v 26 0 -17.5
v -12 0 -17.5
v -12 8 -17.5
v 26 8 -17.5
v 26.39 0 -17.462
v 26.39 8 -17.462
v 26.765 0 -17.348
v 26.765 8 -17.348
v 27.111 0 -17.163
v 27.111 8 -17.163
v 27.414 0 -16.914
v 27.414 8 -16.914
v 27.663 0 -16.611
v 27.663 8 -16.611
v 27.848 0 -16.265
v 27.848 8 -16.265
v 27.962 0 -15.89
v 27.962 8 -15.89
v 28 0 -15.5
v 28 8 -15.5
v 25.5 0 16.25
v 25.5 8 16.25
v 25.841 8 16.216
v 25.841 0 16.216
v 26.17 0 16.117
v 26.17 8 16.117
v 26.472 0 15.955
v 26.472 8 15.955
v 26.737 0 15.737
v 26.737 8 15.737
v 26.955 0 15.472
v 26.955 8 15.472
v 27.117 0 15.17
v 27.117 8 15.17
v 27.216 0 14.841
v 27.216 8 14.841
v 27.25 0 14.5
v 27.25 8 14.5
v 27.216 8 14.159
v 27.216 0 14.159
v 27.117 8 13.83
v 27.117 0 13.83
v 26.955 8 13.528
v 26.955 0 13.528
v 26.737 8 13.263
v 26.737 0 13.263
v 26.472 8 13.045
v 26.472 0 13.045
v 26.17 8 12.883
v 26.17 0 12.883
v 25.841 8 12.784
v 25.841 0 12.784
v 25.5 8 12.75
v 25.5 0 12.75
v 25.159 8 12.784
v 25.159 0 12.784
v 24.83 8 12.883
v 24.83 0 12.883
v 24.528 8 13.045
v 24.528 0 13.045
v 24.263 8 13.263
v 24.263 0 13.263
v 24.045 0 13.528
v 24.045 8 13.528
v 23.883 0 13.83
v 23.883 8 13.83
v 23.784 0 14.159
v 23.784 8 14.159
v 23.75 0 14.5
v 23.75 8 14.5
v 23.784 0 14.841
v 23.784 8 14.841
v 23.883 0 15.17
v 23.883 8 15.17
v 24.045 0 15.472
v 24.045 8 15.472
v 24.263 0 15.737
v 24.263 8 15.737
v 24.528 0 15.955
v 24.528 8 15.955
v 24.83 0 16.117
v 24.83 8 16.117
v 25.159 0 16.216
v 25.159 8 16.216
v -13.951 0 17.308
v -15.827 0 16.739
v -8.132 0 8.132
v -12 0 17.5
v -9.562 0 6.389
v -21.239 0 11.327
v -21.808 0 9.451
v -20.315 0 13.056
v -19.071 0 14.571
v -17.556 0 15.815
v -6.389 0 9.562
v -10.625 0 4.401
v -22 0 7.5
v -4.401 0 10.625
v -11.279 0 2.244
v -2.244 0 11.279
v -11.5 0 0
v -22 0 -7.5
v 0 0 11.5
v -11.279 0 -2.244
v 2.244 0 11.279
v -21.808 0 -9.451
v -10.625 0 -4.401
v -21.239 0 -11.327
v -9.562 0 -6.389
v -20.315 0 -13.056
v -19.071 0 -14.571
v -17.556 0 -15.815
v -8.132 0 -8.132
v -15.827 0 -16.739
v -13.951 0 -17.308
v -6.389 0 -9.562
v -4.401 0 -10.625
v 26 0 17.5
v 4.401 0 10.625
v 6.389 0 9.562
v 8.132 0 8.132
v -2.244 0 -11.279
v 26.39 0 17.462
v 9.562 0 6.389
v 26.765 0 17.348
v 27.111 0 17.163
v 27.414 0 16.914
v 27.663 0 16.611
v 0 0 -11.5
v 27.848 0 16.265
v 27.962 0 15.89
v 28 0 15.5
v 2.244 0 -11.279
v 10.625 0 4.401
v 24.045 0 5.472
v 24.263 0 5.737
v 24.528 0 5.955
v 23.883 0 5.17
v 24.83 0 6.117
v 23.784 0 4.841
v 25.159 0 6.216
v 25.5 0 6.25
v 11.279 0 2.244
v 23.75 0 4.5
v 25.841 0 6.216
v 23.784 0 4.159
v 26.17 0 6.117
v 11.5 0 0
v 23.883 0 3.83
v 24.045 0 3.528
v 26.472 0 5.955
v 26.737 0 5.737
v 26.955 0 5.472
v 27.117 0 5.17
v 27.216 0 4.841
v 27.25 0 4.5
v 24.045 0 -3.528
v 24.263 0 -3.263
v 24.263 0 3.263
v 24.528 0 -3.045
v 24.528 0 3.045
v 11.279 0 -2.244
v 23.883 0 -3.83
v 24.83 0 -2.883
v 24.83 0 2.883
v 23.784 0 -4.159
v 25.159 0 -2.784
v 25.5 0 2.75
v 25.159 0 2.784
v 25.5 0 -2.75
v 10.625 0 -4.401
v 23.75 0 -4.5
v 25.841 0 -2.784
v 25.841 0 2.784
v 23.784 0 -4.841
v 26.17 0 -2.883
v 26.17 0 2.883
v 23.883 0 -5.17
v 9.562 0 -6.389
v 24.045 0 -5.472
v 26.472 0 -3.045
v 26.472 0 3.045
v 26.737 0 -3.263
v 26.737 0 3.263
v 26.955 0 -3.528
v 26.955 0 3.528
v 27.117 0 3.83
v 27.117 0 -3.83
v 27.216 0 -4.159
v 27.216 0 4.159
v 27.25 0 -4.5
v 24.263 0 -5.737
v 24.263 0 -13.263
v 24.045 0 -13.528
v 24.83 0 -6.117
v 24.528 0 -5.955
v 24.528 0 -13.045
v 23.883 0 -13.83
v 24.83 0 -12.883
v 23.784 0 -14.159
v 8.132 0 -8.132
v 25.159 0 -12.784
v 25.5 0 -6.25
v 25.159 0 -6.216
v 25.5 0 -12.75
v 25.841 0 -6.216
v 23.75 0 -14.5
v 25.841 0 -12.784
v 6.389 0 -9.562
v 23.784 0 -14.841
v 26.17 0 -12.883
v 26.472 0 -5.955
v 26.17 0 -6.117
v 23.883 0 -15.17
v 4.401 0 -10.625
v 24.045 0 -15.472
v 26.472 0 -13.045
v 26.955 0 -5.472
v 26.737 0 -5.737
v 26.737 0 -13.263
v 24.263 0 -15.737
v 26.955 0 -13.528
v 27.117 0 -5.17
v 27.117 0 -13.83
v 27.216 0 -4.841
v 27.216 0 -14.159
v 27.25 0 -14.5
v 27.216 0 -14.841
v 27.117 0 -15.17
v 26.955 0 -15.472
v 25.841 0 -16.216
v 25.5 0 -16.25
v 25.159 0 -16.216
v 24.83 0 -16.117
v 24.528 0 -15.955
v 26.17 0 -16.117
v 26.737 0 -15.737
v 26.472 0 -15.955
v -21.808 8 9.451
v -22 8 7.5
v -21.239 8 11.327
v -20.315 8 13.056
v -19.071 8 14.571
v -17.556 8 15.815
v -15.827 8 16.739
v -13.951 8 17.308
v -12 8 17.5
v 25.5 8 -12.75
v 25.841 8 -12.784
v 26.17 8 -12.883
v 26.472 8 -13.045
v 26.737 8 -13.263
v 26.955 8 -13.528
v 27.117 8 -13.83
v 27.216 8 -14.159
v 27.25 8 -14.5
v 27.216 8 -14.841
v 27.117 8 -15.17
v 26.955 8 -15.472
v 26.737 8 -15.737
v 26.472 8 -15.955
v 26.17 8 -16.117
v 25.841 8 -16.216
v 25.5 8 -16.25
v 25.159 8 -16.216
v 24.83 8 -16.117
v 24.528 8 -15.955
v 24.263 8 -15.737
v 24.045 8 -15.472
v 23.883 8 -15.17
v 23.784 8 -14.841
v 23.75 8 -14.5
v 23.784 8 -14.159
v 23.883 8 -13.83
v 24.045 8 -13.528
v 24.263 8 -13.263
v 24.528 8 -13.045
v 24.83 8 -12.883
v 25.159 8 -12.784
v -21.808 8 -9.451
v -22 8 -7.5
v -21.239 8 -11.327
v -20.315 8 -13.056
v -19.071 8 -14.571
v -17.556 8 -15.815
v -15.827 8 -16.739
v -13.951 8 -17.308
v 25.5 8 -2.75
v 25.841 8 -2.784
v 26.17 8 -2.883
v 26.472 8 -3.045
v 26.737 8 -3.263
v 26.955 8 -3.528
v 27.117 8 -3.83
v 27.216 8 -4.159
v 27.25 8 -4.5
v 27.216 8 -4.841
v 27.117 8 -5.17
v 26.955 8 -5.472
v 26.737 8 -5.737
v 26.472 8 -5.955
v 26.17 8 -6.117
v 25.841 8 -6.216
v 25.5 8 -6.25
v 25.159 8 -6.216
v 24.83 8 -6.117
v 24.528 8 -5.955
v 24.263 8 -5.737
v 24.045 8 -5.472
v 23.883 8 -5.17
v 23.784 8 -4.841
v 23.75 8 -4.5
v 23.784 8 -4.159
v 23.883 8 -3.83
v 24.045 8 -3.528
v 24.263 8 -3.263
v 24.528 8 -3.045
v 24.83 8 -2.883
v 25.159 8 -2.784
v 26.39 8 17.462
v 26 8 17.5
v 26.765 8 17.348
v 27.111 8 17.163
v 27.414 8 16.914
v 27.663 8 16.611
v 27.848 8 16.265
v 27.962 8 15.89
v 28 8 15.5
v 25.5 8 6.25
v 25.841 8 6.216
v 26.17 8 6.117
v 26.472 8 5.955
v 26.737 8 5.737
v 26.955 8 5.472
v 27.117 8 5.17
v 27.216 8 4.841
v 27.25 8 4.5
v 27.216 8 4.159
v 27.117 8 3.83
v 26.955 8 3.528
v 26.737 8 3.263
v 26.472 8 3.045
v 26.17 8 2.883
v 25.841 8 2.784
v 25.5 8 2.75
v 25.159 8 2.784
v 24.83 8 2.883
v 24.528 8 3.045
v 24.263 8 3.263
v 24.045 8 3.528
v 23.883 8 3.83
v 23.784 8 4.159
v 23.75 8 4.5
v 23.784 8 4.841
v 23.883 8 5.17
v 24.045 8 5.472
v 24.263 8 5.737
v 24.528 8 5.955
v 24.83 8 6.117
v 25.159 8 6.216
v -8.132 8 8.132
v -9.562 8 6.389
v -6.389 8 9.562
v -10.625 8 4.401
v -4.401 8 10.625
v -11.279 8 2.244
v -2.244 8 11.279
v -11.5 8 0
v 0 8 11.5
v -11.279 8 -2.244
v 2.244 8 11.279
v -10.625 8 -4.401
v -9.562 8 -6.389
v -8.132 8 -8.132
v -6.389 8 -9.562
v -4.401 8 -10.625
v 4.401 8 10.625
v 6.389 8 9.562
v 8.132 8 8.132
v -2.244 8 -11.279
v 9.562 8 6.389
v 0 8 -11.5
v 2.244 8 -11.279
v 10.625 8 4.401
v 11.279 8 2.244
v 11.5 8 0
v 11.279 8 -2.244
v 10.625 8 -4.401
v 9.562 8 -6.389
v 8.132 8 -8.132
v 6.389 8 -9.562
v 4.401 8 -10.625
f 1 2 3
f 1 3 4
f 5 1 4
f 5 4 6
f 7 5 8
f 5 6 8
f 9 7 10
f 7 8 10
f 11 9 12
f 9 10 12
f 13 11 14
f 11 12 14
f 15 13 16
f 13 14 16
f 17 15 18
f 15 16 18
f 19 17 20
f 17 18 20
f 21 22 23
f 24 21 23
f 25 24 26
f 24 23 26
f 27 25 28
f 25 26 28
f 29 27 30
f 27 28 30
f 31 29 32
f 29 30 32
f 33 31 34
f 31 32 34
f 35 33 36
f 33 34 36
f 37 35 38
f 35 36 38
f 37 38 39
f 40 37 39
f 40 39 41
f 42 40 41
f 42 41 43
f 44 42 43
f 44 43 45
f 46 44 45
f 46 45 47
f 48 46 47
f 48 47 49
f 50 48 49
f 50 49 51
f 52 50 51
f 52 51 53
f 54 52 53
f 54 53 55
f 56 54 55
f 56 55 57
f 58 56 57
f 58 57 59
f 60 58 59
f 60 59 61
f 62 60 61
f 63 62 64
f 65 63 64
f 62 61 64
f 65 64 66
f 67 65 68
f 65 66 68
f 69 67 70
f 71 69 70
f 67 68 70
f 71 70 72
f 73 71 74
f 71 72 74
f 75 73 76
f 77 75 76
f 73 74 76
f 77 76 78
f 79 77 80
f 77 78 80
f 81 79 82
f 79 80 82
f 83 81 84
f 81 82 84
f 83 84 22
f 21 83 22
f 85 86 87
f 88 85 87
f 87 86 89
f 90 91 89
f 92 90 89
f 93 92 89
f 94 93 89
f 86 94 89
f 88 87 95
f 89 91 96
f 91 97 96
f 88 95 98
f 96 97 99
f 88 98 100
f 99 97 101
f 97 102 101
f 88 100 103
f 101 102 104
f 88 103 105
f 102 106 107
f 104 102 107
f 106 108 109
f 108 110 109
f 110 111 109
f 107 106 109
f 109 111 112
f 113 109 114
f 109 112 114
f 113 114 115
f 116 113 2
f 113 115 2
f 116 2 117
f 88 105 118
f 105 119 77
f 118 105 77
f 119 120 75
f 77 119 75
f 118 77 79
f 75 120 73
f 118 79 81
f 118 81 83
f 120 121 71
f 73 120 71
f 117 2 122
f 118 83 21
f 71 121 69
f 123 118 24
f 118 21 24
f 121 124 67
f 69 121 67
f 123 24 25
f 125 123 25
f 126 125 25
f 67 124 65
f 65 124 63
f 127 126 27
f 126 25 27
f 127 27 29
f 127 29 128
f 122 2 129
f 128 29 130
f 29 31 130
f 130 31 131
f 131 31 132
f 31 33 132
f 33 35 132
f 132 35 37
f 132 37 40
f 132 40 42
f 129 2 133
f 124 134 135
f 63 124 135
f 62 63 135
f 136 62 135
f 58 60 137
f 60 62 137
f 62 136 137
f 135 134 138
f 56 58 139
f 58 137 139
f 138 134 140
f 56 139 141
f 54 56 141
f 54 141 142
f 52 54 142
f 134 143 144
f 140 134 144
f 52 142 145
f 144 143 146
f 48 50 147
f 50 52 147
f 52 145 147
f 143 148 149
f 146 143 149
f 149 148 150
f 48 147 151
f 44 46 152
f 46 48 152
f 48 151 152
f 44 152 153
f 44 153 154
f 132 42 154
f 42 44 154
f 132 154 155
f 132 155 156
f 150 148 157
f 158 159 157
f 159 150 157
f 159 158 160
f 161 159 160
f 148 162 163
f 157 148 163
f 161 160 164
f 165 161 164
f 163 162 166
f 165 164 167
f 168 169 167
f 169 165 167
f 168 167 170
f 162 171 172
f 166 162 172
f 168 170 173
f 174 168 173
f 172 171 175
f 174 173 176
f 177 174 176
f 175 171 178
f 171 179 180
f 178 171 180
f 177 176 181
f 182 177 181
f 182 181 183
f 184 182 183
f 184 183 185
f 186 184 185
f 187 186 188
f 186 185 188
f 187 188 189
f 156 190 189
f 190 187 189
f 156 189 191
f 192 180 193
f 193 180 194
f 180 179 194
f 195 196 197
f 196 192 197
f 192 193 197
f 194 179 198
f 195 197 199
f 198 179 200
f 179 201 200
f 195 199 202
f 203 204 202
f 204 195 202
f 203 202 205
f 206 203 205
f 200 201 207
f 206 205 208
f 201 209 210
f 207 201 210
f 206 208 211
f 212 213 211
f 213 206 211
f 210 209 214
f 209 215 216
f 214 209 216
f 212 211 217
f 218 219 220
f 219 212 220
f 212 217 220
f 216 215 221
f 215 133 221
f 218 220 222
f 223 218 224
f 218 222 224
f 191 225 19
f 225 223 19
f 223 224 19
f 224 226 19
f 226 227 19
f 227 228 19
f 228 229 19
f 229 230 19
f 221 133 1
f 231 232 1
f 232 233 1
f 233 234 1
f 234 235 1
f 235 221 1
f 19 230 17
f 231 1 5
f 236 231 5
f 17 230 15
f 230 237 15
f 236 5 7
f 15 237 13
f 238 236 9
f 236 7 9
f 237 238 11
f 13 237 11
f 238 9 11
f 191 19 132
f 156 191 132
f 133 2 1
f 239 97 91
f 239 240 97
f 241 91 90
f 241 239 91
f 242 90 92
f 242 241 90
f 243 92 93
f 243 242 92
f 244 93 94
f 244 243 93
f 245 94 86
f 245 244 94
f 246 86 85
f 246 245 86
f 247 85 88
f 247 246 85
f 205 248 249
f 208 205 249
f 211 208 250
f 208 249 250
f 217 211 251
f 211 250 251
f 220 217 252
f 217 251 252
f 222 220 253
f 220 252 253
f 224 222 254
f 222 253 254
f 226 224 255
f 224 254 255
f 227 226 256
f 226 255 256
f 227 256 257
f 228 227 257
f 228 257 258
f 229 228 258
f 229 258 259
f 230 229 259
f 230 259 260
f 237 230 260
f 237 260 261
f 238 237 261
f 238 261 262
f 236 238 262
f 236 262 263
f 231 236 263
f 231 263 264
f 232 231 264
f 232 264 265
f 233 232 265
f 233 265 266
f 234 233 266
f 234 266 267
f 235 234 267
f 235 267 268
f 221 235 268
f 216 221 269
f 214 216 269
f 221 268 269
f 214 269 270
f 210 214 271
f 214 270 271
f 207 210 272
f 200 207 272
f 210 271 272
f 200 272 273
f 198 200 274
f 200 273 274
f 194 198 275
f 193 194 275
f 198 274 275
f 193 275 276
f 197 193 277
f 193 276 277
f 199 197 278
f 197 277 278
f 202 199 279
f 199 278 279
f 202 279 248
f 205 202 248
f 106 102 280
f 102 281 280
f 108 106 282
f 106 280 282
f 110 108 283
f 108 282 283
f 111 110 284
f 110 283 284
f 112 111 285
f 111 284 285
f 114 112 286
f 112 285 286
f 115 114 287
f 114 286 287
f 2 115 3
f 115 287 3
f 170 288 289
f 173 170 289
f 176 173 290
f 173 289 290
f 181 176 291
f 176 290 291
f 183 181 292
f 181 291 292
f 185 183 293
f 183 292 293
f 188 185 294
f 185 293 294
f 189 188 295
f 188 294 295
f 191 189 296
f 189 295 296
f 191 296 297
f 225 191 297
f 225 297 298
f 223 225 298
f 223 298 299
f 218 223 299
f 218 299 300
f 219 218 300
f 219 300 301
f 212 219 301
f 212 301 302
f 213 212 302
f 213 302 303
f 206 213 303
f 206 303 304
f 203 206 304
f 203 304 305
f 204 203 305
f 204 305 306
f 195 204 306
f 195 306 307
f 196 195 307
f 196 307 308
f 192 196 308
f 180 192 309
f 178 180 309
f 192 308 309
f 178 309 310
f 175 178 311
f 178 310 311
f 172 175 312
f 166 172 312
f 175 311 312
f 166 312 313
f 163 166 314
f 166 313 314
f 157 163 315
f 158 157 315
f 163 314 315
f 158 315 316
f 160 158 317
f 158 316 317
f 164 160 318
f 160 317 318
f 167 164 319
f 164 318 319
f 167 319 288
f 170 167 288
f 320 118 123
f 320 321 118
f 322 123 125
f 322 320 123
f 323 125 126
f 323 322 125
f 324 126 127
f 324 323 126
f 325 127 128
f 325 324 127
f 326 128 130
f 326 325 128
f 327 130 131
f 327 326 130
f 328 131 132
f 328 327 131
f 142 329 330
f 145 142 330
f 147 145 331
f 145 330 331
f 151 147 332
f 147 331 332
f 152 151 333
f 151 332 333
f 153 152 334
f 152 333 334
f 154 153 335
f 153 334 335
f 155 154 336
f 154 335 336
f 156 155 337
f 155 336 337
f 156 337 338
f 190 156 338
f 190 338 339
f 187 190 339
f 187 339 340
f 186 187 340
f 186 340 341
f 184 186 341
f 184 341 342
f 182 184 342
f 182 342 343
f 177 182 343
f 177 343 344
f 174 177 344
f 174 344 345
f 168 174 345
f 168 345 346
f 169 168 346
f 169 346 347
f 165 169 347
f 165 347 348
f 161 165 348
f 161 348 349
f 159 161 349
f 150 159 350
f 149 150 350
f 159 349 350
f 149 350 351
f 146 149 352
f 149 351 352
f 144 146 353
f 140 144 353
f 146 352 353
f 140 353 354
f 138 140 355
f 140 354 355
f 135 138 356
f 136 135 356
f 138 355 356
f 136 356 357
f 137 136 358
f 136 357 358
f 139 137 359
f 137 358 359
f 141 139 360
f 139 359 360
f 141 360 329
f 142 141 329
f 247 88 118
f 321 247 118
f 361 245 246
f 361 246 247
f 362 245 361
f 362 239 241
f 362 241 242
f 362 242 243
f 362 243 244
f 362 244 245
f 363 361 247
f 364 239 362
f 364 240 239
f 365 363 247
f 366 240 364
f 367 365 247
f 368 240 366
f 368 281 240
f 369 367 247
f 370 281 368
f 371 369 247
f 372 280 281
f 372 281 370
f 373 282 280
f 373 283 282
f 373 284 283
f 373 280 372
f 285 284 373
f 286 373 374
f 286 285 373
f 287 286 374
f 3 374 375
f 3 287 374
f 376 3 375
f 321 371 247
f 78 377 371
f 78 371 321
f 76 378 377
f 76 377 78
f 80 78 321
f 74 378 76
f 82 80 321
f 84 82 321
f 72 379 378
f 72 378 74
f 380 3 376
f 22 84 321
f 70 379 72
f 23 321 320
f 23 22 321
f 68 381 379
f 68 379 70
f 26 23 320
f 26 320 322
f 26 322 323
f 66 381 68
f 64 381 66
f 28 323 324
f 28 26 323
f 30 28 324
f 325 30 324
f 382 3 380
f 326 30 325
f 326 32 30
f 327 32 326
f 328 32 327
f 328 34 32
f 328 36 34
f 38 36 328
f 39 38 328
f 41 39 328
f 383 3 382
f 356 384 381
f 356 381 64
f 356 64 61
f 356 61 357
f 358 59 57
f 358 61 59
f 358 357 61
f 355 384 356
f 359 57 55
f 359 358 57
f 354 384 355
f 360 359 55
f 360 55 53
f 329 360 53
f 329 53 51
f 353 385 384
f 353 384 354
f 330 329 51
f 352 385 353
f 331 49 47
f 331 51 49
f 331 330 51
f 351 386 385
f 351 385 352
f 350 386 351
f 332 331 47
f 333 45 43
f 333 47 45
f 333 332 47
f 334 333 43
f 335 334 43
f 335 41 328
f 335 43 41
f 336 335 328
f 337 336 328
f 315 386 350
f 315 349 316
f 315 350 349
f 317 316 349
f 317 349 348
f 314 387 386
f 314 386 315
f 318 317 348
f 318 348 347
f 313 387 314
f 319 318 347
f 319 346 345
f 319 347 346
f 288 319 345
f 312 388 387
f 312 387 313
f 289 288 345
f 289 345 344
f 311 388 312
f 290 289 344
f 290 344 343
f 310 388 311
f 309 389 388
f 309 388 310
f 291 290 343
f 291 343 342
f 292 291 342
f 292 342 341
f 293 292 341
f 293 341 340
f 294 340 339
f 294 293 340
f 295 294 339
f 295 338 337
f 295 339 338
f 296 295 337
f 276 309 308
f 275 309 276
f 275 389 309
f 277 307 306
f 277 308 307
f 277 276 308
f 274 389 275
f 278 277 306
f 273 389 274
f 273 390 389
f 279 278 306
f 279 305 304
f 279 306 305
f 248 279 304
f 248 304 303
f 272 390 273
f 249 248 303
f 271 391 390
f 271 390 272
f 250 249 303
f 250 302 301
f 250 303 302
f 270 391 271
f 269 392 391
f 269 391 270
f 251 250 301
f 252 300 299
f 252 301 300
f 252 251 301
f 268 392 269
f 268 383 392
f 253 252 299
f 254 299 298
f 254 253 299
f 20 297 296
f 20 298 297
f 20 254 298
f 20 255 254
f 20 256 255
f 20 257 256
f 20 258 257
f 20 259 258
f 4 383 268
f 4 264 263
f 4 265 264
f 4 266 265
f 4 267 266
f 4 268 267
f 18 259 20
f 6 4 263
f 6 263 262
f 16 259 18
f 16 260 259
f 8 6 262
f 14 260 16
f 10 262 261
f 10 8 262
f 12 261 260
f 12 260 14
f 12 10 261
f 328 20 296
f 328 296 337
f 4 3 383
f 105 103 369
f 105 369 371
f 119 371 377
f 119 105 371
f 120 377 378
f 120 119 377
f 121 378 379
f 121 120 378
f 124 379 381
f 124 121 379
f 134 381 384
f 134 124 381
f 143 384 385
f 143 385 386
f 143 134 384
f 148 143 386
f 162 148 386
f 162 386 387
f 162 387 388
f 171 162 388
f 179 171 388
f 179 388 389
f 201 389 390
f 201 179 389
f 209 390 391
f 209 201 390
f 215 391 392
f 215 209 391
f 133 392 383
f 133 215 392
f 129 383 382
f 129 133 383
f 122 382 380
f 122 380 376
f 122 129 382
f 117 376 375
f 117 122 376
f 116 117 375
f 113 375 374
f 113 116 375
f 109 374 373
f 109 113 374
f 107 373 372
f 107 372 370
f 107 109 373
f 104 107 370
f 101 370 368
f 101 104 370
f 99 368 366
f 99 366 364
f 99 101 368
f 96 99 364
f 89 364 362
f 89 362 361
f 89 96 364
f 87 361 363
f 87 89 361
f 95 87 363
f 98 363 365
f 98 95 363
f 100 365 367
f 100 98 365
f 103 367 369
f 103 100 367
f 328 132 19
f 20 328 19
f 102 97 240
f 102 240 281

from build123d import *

# Parameters (mm, degrees)
SKETCH1_W           = 50
SKETCH1_H           = 35
SKETCH1_R           = 11.5
BOSS_EXTRUDE1_DEPTH = 8
FILLET3_R           = 10
FILLET4_R           = 2
SKETCH2_R           = 1.75
CUT_EXTRUDE1_DEPTH  = 34.974254959


with BuildPart() as part:
    # Sketch1 → Boss-Extrude1 (new body)
    with BuildSketch(Plane(origin=(0, 0, 0), x_dir=(1, 0, 0), z_dir=(0, 1, 0))):
        with Locations((3, 0)):
            Rectangle(SKETCH1_W, SKETCH1_H)
        with Locations(Location((0, 0, 0), (0, 0, 270))):
            Circle(SKETCH1_R, mode=Mode.SUBTRACT)
    extrude(amount=BOSS_EXTRUDE1_DEPTH)

    # Fillet3
    fillet3_edges = [part.edges().sort_by_distance(p)[0] for p in [
        (-22, 4, 17.5),
        (-22, 4, -17.5),
    ]]
    fillet(fillet3_edges, radius=FILLET3_R)

    # Fillet4
    fillet4_edges = [part.edges().sort_by_distance(p)[0] for p in [
        (28, 4, 17.5),
        (28, 4, -17.5),
    ]]
    fillet(fillet4_edges, radius=FILLET4_R)

    # Sketch2 → Cut-Extrude1 (cut, through all)
    with BuildSketch(Plane(origin=(0, 8, 0), x_dir=(1, 0, 0), z_dir=(0, 1, 0))):
        with Locations(Location((25.5, 4.5, 0), (0, 0, 270))):
            Circle(SKETCH2_R)
        with Locations(Location((25.5, -4.5, 0), (0, 0, 270))):
            Circle(SKETCH2_R)
        with Locations(Location((25.5, -14.5, 0), (0, 0, 270))):
            Circle(SKETCH2_R)
        with Locations(Location((25.5, 14.5, 0), (0, 0, 270))):
            Circle(SKETCH2_R)
    extrude(amount=-CUT_EXTRUDE1_DEPTH, mode=Mode.SUBTRACT)


solid = part.part
